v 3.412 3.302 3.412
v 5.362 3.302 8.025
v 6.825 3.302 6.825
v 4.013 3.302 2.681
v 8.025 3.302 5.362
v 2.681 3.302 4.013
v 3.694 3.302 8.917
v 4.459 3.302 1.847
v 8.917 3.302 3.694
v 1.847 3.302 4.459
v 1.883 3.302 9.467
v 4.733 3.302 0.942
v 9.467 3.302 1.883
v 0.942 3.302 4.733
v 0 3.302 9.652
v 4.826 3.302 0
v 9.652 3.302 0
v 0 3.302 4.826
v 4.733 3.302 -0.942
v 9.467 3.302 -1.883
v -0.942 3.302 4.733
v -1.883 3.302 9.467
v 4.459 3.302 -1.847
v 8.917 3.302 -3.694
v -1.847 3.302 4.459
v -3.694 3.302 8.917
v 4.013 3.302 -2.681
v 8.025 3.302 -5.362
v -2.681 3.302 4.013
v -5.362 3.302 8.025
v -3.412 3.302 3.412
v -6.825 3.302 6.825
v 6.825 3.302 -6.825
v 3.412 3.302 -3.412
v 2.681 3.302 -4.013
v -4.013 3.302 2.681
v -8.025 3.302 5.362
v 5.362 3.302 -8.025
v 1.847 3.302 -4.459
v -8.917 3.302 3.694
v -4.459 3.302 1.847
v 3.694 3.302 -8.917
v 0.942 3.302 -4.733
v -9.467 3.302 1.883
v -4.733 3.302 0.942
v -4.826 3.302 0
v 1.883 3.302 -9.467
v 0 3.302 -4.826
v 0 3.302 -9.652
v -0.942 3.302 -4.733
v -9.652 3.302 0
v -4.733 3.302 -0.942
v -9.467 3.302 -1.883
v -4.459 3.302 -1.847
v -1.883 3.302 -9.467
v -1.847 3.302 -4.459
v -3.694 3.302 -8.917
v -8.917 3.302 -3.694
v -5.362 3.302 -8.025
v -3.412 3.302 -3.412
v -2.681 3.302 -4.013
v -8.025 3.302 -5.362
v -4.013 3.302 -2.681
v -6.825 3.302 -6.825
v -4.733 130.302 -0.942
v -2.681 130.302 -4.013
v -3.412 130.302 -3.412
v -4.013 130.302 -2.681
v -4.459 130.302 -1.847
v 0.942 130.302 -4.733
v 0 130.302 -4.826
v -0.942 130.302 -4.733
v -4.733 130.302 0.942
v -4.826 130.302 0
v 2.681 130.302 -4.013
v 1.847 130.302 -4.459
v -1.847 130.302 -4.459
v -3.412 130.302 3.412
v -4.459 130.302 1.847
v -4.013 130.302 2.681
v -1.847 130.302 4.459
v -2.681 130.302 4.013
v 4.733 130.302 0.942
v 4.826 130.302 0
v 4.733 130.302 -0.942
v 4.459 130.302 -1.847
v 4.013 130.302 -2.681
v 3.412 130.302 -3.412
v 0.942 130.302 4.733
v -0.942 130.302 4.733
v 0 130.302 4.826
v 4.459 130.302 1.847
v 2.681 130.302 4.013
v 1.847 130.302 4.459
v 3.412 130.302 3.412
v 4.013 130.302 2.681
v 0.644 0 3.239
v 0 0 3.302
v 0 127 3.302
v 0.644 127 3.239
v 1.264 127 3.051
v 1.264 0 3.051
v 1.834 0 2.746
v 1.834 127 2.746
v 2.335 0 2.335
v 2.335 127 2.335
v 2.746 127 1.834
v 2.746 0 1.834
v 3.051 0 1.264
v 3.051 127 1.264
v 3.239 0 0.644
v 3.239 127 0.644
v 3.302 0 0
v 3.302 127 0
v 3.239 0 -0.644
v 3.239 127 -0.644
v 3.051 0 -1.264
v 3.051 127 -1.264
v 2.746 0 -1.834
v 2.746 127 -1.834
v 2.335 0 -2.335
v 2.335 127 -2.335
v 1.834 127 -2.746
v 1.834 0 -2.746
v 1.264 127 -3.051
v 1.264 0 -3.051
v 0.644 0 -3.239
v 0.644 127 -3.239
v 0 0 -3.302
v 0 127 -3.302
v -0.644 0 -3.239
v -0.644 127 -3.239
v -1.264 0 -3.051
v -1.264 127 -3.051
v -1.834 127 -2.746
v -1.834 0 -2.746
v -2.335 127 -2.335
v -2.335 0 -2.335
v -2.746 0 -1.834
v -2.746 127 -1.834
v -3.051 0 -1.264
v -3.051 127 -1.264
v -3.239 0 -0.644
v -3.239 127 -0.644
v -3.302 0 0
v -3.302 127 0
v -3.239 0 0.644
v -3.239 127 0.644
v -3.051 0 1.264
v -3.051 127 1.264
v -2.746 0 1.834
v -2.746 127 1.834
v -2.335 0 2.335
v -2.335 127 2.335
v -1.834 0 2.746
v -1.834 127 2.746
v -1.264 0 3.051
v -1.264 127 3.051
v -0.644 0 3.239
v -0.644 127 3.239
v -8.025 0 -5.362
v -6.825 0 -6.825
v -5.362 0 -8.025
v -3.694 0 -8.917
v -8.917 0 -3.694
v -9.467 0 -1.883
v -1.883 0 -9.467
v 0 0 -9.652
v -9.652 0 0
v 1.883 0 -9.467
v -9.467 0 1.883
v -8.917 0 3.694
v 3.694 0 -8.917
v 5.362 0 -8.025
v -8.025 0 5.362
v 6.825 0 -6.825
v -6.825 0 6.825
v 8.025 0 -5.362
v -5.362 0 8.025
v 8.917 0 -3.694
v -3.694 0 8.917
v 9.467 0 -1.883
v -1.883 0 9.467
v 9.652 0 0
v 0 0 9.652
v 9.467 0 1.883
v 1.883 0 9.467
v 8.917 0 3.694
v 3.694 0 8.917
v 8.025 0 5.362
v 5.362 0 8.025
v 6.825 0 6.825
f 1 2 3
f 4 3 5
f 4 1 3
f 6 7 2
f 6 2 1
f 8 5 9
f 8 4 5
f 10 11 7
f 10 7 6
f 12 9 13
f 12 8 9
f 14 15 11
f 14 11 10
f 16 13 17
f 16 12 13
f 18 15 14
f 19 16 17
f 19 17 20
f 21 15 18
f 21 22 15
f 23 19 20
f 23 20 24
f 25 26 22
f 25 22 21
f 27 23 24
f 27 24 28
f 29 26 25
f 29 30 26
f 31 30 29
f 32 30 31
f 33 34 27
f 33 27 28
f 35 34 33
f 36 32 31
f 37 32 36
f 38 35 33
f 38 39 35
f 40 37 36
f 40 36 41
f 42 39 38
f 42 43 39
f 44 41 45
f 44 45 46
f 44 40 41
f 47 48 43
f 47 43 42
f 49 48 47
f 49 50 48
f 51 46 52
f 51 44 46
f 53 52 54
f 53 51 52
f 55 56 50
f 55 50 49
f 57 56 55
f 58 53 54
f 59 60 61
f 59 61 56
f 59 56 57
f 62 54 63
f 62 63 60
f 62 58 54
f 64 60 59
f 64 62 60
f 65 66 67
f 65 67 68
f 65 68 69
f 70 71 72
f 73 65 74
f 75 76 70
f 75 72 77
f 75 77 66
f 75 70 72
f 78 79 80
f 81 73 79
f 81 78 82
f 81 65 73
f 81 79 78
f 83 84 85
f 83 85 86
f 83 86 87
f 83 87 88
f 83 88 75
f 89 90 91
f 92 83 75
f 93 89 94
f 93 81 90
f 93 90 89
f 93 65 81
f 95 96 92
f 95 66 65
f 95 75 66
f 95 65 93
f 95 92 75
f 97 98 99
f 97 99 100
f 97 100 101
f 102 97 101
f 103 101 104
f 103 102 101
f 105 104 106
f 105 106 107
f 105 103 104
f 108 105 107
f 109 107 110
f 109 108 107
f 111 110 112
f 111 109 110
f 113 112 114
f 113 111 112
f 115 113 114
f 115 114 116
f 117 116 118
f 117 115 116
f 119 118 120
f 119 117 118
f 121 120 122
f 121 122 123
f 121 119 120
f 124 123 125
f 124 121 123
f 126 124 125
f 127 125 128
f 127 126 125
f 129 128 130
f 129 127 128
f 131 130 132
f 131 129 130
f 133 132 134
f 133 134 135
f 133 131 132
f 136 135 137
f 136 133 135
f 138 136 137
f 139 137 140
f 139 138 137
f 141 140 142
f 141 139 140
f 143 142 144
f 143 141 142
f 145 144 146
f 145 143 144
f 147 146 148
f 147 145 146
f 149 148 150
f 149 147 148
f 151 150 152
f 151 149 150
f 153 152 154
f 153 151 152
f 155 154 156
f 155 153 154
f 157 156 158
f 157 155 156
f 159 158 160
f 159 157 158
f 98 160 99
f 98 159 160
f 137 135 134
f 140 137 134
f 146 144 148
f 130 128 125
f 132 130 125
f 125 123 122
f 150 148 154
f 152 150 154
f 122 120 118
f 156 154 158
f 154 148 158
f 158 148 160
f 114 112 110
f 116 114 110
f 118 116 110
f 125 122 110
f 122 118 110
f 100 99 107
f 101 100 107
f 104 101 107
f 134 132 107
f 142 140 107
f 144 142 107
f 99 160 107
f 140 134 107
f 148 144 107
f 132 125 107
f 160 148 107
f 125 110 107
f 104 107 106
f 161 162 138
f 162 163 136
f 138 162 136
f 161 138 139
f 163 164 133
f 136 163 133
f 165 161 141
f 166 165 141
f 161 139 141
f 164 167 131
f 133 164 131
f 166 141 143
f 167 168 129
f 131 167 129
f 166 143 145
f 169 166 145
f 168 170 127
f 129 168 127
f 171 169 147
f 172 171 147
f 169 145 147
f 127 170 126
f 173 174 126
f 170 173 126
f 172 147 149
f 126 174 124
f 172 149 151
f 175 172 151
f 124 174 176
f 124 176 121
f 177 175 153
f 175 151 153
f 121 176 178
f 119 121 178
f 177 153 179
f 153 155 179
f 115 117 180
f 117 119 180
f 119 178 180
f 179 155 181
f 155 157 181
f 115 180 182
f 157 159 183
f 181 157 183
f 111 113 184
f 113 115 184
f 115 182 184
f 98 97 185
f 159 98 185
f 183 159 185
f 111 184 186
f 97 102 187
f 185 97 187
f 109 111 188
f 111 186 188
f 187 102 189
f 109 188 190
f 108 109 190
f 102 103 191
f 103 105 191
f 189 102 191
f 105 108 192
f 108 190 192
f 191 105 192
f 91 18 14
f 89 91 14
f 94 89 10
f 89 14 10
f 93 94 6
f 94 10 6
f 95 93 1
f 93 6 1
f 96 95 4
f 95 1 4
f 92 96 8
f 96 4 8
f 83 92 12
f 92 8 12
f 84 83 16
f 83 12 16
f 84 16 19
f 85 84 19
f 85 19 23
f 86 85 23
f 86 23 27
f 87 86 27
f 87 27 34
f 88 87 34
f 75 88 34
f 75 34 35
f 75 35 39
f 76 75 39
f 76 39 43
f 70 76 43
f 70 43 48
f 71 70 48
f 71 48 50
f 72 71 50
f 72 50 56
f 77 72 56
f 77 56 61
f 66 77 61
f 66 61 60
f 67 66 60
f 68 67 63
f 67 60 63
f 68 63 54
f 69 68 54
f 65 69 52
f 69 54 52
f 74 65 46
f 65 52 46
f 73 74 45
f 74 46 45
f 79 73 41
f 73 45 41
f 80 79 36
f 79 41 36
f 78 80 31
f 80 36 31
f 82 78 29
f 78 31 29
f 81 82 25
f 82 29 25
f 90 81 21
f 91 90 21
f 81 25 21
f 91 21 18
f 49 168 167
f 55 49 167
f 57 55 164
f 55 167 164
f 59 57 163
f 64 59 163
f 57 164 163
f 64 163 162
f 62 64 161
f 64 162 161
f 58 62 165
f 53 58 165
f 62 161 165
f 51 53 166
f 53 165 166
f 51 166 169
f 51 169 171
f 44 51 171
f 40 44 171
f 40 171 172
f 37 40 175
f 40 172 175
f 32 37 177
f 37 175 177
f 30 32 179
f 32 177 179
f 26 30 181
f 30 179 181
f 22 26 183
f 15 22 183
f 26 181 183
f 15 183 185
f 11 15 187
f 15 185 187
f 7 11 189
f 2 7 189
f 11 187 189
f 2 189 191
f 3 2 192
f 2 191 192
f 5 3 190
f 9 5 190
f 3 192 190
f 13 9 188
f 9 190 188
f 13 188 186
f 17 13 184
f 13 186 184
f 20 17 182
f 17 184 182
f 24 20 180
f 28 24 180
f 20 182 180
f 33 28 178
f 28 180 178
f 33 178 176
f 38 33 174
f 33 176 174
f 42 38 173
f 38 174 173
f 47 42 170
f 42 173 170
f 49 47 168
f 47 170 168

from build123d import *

# Parameters (mm, degrees)
SKETCH1_R           = 9.652
BOSS_EXTRUDE1_DEPTH = 3.302
SKETCH1_4_R         = 4.826
BOSS_EXTRUDE2_DEPTH = 130.302
SKETCH1_6_R         = 3.302
CUT_EXTRUDE1_DEPTH  = 127


with BuildPart() as part:
    # Sketch1 → Boss-Extrude1 (new body)
    with BuildSketch(Plane(origin=(0, 0, 0), x_dir=(1, 0, 0), z_dir=(0, 1, 0))):
        Circle(SKETCH1_R)
    extrude(amount=BOSS_EXTRUDE1_DEPTH)

    # Sketch1<4> → Boss-Extrude2 (add)
    with BuildSketch(Plane(origin=(0, 0, 0), x_dir=(1, 0, 0), z_dir=(0, 1, 0))):
        Circle(SKETCH1_4_R)
    extrude(amount=BOSS_EXTRUDE2_DEPTH)

    # Sketch1<6> → Cut-Extrude1 (cut)
    with BuildSketch(Plane(origin=(0, 0, 0), x_dir=(1, 0, 0), z_dir=(0, 1, 0))):
        Circle(SKETCH1_6_R)
    extrude(amount=CUT_EXTRUDE1_DEPTH, mode=Mode.SUBTRACT)


solid = part.part
